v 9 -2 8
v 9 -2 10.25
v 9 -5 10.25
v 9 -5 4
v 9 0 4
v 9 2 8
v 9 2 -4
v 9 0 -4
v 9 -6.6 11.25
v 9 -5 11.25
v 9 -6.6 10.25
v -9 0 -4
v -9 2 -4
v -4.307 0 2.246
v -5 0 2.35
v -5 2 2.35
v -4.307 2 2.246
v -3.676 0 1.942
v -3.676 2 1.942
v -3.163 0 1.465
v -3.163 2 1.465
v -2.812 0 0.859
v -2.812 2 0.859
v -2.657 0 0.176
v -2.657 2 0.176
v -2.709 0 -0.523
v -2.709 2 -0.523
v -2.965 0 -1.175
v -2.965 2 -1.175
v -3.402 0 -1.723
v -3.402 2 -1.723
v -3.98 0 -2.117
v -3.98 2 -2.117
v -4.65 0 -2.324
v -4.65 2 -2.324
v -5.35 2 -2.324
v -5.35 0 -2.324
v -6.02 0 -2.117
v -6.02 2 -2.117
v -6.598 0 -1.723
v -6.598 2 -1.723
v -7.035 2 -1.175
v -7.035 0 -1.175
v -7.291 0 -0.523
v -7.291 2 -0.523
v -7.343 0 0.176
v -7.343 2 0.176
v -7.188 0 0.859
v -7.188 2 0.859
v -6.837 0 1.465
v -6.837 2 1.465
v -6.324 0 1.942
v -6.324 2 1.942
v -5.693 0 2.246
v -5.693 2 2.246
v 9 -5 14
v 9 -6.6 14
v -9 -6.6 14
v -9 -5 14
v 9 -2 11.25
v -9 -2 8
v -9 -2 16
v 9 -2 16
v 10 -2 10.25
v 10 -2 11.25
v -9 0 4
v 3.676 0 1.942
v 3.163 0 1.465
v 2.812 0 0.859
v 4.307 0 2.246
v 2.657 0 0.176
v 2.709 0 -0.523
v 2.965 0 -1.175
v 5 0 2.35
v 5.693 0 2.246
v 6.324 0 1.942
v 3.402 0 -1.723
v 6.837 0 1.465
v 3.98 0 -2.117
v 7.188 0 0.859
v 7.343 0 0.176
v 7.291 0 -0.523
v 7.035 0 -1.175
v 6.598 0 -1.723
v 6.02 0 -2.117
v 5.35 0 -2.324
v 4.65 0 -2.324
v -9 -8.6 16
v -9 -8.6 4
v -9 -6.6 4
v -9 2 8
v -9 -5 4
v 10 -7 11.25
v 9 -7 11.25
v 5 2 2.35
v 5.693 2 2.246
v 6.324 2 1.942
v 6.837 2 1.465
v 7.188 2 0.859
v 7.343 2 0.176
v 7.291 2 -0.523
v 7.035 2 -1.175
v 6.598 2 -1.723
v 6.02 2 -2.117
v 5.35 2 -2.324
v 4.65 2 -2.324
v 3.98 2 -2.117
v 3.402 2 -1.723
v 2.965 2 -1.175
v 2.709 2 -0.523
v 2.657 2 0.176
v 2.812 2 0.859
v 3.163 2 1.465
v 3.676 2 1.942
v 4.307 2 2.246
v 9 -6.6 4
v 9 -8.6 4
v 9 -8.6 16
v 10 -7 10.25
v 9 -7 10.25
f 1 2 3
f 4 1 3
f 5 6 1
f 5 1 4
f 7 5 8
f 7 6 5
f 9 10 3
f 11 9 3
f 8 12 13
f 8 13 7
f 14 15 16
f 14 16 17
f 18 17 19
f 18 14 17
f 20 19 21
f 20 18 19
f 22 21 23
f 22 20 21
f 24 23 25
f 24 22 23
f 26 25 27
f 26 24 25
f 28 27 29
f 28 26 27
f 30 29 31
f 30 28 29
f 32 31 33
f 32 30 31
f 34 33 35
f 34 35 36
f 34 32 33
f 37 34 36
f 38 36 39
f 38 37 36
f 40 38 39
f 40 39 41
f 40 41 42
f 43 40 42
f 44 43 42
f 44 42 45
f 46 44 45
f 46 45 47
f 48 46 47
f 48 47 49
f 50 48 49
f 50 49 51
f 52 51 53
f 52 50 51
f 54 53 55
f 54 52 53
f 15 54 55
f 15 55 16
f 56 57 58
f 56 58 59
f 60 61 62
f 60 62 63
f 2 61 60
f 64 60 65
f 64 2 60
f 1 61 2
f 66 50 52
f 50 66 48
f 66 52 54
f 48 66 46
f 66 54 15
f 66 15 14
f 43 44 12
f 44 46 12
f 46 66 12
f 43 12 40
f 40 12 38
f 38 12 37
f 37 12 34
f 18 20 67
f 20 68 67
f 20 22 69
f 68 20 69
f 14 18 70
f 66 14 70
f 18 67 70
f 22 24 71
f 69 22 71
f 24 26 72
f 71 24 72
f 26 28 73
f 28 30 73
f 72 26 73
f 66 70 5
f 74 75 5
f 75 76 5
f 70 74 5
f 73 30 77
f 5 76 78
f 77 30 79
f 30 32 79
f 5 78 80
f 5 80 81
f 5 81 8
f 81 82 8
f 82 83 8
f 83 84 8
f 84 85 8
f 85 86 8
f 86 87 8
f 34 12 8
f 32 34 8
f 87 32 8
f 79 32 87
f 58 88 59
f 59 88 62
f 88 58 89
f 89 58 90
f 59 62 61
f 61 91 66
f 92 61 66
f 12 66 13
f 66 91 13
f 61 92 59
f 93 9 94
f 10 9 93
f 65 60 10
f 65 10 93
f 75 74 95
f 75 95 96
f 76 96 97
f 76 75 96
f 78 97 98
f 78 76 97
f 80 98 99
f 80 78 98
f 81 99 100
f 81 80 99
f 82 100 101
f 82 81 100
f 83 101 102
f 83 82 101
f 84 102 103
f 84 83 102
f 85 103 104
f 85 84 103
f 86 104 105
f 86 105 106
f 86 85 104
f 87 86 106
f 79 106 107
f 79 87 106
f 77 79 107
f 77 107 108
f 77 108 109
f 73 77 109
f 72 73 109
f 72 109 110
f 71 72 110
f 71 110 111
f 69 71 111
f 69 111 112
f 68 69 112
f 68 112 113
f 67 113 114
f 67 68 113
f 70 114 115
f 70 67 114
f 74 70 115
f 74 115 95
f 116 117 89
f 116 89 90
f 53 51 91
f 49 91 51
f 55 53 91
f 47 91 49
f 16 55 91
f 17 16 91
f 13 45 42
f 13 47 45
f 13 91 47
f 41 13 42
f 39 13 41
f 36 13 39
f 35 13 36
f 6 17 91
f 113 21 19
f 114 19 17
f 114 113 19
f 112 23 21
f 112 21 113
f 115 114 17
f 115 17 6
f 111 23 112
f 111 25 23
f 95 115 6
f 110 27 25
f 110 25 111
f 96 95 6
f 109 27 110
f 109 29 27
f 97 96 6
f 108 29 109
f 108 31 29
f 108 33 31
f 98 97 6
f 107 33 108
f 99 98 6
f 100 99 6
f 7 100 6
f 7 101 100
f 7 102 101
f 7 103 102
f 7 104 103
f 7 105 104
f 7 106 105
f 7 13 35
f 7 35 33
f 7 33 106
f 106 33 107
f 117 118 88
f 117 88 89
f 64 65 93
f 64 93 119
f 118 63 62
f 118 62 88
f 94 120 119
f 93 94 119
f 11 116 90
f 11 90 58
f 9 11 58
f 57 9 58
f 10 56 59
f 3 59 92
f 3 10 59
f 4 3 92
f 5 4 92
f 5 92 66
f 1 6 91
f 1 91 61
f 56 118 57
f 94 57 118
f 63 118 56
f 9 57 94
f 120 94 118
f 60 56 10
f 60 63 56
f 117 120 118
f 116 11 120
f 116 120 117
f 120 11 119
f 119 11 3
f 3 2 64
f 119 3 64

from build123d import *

# Parameters (mm, degrees)
SKETCH1_W           = 18
SKETCH1_H           = 12
SKETCH1_R           = 2.35
BOSS_EXTRUDE1_DEPTH = 2
BOSS_EXTRUDE2_DEPTH = 18
SKETCH3_W           = 1
SKETCH3_H           = 1
BOSS_EXTRUDE3_DEPTH = 5


with BuildPart() as part:
    # Sketch1 → Boss-Extrude1 (new body)
    with BuildSketch(Plane(origin=(0, 0, 0), x_dir=(1, 0, 0), z_dir=(0, 1, 0))):
        with Locations((0, -2)):
            Rectangle(SKETCH1_W, SKETCH1_H)
        with Locations(Location((-5, 0, 0), (0, 0, 270))):
            Circle(SKETCH1_R, mode=Mode.SUBTRACT)
        with Locations(Location((5, 0, 0), (0, 0, 270))):
            Circle(SKETCH1_R, mode=Mode.SUBTRACT)
    extrude(amount=BOSS_EXTRUDE1_DEPTH)

    # Sketch2 → Boss-Extrude2 (add)
    with BuildSketch(Plane(origin=(9, 0, 0), x_dir=(0, 0, -1), z_dir=(1, 0, 0))):
        Polygon((-4, 0), (-8, 0), (-8, -2), (-16, -2), (-16, -8.6), (-4, -8.6), (-4, -6.6), (-14, -6.6), (-14, -5), (-4, -5), align=None)
    extrude(amount=-BOSS_EXTRUDE2_DEPTH)

    # Sketch3 → Boss-Extrude3 (add)
    with BuildSketch(Plane(origin=(0, -2, 0), x_dir=(1, 0, 0), z_dir=(0, 1, 0))):
        with Locations((9.5, -10.75)):
            Rectangle(SKETCH3_W, SKETCH3_H)
    extrude(amount=-BOSS_EXTRUDE3_DEPTH)


solid = part.part
